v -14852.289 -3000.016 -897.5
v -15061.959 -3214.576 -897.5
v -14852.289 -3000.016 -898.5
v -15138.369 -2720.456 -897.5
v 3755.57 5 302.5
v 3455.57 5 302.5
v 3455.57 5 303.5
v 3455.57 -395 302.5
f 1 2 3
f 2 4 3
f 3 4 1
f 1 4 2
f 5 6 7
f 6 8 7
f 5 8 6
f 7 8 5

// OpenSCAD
module excavator001()
{


translate([-6226.5789829932, 1720.6341386565, -297.5000000000]) {
	rotate(a=180, v=[1.0000000000, 0.0000000000, 0.0]) {
		 color( "Blue", a=0.5 )
 polyhedron(
 points=[
 [-8625.71, 4720.65, 600.0],
 [-8625.71, 4720.65, 601.0],
 [-8835.38, 4935.21, 600.0],
 [-8911.79, 4441.09, 600.0]],
 faces=[[0,1,2],[0,3,1],[0,2,3],[1,3,2]]);
	//	import("STL/boom.stl");
	}
}

translate(v = [0.0000000000, 0.0000000000, 0.0000000000]) {
	rotate(a = 0.0000000000, v = [1.0000000000, 0.0000000000, 0.0000000000]) {
		 color( "Red", a=0.5 )
 polyhedron(
 points=[
 [3455.57,    5.00, 302.5],
 [3455.57,    5.00, 303.5],
 [3755.57,    5.00, 302.5],
 [3455.57, -395.00, 302.5]],
 faces=[[0,1,2],[0,3,1],[0,2,3],[1,3,2]]);
	//	import("STL/boom_ex_375.stl");
	}
}
}

excavator001();
